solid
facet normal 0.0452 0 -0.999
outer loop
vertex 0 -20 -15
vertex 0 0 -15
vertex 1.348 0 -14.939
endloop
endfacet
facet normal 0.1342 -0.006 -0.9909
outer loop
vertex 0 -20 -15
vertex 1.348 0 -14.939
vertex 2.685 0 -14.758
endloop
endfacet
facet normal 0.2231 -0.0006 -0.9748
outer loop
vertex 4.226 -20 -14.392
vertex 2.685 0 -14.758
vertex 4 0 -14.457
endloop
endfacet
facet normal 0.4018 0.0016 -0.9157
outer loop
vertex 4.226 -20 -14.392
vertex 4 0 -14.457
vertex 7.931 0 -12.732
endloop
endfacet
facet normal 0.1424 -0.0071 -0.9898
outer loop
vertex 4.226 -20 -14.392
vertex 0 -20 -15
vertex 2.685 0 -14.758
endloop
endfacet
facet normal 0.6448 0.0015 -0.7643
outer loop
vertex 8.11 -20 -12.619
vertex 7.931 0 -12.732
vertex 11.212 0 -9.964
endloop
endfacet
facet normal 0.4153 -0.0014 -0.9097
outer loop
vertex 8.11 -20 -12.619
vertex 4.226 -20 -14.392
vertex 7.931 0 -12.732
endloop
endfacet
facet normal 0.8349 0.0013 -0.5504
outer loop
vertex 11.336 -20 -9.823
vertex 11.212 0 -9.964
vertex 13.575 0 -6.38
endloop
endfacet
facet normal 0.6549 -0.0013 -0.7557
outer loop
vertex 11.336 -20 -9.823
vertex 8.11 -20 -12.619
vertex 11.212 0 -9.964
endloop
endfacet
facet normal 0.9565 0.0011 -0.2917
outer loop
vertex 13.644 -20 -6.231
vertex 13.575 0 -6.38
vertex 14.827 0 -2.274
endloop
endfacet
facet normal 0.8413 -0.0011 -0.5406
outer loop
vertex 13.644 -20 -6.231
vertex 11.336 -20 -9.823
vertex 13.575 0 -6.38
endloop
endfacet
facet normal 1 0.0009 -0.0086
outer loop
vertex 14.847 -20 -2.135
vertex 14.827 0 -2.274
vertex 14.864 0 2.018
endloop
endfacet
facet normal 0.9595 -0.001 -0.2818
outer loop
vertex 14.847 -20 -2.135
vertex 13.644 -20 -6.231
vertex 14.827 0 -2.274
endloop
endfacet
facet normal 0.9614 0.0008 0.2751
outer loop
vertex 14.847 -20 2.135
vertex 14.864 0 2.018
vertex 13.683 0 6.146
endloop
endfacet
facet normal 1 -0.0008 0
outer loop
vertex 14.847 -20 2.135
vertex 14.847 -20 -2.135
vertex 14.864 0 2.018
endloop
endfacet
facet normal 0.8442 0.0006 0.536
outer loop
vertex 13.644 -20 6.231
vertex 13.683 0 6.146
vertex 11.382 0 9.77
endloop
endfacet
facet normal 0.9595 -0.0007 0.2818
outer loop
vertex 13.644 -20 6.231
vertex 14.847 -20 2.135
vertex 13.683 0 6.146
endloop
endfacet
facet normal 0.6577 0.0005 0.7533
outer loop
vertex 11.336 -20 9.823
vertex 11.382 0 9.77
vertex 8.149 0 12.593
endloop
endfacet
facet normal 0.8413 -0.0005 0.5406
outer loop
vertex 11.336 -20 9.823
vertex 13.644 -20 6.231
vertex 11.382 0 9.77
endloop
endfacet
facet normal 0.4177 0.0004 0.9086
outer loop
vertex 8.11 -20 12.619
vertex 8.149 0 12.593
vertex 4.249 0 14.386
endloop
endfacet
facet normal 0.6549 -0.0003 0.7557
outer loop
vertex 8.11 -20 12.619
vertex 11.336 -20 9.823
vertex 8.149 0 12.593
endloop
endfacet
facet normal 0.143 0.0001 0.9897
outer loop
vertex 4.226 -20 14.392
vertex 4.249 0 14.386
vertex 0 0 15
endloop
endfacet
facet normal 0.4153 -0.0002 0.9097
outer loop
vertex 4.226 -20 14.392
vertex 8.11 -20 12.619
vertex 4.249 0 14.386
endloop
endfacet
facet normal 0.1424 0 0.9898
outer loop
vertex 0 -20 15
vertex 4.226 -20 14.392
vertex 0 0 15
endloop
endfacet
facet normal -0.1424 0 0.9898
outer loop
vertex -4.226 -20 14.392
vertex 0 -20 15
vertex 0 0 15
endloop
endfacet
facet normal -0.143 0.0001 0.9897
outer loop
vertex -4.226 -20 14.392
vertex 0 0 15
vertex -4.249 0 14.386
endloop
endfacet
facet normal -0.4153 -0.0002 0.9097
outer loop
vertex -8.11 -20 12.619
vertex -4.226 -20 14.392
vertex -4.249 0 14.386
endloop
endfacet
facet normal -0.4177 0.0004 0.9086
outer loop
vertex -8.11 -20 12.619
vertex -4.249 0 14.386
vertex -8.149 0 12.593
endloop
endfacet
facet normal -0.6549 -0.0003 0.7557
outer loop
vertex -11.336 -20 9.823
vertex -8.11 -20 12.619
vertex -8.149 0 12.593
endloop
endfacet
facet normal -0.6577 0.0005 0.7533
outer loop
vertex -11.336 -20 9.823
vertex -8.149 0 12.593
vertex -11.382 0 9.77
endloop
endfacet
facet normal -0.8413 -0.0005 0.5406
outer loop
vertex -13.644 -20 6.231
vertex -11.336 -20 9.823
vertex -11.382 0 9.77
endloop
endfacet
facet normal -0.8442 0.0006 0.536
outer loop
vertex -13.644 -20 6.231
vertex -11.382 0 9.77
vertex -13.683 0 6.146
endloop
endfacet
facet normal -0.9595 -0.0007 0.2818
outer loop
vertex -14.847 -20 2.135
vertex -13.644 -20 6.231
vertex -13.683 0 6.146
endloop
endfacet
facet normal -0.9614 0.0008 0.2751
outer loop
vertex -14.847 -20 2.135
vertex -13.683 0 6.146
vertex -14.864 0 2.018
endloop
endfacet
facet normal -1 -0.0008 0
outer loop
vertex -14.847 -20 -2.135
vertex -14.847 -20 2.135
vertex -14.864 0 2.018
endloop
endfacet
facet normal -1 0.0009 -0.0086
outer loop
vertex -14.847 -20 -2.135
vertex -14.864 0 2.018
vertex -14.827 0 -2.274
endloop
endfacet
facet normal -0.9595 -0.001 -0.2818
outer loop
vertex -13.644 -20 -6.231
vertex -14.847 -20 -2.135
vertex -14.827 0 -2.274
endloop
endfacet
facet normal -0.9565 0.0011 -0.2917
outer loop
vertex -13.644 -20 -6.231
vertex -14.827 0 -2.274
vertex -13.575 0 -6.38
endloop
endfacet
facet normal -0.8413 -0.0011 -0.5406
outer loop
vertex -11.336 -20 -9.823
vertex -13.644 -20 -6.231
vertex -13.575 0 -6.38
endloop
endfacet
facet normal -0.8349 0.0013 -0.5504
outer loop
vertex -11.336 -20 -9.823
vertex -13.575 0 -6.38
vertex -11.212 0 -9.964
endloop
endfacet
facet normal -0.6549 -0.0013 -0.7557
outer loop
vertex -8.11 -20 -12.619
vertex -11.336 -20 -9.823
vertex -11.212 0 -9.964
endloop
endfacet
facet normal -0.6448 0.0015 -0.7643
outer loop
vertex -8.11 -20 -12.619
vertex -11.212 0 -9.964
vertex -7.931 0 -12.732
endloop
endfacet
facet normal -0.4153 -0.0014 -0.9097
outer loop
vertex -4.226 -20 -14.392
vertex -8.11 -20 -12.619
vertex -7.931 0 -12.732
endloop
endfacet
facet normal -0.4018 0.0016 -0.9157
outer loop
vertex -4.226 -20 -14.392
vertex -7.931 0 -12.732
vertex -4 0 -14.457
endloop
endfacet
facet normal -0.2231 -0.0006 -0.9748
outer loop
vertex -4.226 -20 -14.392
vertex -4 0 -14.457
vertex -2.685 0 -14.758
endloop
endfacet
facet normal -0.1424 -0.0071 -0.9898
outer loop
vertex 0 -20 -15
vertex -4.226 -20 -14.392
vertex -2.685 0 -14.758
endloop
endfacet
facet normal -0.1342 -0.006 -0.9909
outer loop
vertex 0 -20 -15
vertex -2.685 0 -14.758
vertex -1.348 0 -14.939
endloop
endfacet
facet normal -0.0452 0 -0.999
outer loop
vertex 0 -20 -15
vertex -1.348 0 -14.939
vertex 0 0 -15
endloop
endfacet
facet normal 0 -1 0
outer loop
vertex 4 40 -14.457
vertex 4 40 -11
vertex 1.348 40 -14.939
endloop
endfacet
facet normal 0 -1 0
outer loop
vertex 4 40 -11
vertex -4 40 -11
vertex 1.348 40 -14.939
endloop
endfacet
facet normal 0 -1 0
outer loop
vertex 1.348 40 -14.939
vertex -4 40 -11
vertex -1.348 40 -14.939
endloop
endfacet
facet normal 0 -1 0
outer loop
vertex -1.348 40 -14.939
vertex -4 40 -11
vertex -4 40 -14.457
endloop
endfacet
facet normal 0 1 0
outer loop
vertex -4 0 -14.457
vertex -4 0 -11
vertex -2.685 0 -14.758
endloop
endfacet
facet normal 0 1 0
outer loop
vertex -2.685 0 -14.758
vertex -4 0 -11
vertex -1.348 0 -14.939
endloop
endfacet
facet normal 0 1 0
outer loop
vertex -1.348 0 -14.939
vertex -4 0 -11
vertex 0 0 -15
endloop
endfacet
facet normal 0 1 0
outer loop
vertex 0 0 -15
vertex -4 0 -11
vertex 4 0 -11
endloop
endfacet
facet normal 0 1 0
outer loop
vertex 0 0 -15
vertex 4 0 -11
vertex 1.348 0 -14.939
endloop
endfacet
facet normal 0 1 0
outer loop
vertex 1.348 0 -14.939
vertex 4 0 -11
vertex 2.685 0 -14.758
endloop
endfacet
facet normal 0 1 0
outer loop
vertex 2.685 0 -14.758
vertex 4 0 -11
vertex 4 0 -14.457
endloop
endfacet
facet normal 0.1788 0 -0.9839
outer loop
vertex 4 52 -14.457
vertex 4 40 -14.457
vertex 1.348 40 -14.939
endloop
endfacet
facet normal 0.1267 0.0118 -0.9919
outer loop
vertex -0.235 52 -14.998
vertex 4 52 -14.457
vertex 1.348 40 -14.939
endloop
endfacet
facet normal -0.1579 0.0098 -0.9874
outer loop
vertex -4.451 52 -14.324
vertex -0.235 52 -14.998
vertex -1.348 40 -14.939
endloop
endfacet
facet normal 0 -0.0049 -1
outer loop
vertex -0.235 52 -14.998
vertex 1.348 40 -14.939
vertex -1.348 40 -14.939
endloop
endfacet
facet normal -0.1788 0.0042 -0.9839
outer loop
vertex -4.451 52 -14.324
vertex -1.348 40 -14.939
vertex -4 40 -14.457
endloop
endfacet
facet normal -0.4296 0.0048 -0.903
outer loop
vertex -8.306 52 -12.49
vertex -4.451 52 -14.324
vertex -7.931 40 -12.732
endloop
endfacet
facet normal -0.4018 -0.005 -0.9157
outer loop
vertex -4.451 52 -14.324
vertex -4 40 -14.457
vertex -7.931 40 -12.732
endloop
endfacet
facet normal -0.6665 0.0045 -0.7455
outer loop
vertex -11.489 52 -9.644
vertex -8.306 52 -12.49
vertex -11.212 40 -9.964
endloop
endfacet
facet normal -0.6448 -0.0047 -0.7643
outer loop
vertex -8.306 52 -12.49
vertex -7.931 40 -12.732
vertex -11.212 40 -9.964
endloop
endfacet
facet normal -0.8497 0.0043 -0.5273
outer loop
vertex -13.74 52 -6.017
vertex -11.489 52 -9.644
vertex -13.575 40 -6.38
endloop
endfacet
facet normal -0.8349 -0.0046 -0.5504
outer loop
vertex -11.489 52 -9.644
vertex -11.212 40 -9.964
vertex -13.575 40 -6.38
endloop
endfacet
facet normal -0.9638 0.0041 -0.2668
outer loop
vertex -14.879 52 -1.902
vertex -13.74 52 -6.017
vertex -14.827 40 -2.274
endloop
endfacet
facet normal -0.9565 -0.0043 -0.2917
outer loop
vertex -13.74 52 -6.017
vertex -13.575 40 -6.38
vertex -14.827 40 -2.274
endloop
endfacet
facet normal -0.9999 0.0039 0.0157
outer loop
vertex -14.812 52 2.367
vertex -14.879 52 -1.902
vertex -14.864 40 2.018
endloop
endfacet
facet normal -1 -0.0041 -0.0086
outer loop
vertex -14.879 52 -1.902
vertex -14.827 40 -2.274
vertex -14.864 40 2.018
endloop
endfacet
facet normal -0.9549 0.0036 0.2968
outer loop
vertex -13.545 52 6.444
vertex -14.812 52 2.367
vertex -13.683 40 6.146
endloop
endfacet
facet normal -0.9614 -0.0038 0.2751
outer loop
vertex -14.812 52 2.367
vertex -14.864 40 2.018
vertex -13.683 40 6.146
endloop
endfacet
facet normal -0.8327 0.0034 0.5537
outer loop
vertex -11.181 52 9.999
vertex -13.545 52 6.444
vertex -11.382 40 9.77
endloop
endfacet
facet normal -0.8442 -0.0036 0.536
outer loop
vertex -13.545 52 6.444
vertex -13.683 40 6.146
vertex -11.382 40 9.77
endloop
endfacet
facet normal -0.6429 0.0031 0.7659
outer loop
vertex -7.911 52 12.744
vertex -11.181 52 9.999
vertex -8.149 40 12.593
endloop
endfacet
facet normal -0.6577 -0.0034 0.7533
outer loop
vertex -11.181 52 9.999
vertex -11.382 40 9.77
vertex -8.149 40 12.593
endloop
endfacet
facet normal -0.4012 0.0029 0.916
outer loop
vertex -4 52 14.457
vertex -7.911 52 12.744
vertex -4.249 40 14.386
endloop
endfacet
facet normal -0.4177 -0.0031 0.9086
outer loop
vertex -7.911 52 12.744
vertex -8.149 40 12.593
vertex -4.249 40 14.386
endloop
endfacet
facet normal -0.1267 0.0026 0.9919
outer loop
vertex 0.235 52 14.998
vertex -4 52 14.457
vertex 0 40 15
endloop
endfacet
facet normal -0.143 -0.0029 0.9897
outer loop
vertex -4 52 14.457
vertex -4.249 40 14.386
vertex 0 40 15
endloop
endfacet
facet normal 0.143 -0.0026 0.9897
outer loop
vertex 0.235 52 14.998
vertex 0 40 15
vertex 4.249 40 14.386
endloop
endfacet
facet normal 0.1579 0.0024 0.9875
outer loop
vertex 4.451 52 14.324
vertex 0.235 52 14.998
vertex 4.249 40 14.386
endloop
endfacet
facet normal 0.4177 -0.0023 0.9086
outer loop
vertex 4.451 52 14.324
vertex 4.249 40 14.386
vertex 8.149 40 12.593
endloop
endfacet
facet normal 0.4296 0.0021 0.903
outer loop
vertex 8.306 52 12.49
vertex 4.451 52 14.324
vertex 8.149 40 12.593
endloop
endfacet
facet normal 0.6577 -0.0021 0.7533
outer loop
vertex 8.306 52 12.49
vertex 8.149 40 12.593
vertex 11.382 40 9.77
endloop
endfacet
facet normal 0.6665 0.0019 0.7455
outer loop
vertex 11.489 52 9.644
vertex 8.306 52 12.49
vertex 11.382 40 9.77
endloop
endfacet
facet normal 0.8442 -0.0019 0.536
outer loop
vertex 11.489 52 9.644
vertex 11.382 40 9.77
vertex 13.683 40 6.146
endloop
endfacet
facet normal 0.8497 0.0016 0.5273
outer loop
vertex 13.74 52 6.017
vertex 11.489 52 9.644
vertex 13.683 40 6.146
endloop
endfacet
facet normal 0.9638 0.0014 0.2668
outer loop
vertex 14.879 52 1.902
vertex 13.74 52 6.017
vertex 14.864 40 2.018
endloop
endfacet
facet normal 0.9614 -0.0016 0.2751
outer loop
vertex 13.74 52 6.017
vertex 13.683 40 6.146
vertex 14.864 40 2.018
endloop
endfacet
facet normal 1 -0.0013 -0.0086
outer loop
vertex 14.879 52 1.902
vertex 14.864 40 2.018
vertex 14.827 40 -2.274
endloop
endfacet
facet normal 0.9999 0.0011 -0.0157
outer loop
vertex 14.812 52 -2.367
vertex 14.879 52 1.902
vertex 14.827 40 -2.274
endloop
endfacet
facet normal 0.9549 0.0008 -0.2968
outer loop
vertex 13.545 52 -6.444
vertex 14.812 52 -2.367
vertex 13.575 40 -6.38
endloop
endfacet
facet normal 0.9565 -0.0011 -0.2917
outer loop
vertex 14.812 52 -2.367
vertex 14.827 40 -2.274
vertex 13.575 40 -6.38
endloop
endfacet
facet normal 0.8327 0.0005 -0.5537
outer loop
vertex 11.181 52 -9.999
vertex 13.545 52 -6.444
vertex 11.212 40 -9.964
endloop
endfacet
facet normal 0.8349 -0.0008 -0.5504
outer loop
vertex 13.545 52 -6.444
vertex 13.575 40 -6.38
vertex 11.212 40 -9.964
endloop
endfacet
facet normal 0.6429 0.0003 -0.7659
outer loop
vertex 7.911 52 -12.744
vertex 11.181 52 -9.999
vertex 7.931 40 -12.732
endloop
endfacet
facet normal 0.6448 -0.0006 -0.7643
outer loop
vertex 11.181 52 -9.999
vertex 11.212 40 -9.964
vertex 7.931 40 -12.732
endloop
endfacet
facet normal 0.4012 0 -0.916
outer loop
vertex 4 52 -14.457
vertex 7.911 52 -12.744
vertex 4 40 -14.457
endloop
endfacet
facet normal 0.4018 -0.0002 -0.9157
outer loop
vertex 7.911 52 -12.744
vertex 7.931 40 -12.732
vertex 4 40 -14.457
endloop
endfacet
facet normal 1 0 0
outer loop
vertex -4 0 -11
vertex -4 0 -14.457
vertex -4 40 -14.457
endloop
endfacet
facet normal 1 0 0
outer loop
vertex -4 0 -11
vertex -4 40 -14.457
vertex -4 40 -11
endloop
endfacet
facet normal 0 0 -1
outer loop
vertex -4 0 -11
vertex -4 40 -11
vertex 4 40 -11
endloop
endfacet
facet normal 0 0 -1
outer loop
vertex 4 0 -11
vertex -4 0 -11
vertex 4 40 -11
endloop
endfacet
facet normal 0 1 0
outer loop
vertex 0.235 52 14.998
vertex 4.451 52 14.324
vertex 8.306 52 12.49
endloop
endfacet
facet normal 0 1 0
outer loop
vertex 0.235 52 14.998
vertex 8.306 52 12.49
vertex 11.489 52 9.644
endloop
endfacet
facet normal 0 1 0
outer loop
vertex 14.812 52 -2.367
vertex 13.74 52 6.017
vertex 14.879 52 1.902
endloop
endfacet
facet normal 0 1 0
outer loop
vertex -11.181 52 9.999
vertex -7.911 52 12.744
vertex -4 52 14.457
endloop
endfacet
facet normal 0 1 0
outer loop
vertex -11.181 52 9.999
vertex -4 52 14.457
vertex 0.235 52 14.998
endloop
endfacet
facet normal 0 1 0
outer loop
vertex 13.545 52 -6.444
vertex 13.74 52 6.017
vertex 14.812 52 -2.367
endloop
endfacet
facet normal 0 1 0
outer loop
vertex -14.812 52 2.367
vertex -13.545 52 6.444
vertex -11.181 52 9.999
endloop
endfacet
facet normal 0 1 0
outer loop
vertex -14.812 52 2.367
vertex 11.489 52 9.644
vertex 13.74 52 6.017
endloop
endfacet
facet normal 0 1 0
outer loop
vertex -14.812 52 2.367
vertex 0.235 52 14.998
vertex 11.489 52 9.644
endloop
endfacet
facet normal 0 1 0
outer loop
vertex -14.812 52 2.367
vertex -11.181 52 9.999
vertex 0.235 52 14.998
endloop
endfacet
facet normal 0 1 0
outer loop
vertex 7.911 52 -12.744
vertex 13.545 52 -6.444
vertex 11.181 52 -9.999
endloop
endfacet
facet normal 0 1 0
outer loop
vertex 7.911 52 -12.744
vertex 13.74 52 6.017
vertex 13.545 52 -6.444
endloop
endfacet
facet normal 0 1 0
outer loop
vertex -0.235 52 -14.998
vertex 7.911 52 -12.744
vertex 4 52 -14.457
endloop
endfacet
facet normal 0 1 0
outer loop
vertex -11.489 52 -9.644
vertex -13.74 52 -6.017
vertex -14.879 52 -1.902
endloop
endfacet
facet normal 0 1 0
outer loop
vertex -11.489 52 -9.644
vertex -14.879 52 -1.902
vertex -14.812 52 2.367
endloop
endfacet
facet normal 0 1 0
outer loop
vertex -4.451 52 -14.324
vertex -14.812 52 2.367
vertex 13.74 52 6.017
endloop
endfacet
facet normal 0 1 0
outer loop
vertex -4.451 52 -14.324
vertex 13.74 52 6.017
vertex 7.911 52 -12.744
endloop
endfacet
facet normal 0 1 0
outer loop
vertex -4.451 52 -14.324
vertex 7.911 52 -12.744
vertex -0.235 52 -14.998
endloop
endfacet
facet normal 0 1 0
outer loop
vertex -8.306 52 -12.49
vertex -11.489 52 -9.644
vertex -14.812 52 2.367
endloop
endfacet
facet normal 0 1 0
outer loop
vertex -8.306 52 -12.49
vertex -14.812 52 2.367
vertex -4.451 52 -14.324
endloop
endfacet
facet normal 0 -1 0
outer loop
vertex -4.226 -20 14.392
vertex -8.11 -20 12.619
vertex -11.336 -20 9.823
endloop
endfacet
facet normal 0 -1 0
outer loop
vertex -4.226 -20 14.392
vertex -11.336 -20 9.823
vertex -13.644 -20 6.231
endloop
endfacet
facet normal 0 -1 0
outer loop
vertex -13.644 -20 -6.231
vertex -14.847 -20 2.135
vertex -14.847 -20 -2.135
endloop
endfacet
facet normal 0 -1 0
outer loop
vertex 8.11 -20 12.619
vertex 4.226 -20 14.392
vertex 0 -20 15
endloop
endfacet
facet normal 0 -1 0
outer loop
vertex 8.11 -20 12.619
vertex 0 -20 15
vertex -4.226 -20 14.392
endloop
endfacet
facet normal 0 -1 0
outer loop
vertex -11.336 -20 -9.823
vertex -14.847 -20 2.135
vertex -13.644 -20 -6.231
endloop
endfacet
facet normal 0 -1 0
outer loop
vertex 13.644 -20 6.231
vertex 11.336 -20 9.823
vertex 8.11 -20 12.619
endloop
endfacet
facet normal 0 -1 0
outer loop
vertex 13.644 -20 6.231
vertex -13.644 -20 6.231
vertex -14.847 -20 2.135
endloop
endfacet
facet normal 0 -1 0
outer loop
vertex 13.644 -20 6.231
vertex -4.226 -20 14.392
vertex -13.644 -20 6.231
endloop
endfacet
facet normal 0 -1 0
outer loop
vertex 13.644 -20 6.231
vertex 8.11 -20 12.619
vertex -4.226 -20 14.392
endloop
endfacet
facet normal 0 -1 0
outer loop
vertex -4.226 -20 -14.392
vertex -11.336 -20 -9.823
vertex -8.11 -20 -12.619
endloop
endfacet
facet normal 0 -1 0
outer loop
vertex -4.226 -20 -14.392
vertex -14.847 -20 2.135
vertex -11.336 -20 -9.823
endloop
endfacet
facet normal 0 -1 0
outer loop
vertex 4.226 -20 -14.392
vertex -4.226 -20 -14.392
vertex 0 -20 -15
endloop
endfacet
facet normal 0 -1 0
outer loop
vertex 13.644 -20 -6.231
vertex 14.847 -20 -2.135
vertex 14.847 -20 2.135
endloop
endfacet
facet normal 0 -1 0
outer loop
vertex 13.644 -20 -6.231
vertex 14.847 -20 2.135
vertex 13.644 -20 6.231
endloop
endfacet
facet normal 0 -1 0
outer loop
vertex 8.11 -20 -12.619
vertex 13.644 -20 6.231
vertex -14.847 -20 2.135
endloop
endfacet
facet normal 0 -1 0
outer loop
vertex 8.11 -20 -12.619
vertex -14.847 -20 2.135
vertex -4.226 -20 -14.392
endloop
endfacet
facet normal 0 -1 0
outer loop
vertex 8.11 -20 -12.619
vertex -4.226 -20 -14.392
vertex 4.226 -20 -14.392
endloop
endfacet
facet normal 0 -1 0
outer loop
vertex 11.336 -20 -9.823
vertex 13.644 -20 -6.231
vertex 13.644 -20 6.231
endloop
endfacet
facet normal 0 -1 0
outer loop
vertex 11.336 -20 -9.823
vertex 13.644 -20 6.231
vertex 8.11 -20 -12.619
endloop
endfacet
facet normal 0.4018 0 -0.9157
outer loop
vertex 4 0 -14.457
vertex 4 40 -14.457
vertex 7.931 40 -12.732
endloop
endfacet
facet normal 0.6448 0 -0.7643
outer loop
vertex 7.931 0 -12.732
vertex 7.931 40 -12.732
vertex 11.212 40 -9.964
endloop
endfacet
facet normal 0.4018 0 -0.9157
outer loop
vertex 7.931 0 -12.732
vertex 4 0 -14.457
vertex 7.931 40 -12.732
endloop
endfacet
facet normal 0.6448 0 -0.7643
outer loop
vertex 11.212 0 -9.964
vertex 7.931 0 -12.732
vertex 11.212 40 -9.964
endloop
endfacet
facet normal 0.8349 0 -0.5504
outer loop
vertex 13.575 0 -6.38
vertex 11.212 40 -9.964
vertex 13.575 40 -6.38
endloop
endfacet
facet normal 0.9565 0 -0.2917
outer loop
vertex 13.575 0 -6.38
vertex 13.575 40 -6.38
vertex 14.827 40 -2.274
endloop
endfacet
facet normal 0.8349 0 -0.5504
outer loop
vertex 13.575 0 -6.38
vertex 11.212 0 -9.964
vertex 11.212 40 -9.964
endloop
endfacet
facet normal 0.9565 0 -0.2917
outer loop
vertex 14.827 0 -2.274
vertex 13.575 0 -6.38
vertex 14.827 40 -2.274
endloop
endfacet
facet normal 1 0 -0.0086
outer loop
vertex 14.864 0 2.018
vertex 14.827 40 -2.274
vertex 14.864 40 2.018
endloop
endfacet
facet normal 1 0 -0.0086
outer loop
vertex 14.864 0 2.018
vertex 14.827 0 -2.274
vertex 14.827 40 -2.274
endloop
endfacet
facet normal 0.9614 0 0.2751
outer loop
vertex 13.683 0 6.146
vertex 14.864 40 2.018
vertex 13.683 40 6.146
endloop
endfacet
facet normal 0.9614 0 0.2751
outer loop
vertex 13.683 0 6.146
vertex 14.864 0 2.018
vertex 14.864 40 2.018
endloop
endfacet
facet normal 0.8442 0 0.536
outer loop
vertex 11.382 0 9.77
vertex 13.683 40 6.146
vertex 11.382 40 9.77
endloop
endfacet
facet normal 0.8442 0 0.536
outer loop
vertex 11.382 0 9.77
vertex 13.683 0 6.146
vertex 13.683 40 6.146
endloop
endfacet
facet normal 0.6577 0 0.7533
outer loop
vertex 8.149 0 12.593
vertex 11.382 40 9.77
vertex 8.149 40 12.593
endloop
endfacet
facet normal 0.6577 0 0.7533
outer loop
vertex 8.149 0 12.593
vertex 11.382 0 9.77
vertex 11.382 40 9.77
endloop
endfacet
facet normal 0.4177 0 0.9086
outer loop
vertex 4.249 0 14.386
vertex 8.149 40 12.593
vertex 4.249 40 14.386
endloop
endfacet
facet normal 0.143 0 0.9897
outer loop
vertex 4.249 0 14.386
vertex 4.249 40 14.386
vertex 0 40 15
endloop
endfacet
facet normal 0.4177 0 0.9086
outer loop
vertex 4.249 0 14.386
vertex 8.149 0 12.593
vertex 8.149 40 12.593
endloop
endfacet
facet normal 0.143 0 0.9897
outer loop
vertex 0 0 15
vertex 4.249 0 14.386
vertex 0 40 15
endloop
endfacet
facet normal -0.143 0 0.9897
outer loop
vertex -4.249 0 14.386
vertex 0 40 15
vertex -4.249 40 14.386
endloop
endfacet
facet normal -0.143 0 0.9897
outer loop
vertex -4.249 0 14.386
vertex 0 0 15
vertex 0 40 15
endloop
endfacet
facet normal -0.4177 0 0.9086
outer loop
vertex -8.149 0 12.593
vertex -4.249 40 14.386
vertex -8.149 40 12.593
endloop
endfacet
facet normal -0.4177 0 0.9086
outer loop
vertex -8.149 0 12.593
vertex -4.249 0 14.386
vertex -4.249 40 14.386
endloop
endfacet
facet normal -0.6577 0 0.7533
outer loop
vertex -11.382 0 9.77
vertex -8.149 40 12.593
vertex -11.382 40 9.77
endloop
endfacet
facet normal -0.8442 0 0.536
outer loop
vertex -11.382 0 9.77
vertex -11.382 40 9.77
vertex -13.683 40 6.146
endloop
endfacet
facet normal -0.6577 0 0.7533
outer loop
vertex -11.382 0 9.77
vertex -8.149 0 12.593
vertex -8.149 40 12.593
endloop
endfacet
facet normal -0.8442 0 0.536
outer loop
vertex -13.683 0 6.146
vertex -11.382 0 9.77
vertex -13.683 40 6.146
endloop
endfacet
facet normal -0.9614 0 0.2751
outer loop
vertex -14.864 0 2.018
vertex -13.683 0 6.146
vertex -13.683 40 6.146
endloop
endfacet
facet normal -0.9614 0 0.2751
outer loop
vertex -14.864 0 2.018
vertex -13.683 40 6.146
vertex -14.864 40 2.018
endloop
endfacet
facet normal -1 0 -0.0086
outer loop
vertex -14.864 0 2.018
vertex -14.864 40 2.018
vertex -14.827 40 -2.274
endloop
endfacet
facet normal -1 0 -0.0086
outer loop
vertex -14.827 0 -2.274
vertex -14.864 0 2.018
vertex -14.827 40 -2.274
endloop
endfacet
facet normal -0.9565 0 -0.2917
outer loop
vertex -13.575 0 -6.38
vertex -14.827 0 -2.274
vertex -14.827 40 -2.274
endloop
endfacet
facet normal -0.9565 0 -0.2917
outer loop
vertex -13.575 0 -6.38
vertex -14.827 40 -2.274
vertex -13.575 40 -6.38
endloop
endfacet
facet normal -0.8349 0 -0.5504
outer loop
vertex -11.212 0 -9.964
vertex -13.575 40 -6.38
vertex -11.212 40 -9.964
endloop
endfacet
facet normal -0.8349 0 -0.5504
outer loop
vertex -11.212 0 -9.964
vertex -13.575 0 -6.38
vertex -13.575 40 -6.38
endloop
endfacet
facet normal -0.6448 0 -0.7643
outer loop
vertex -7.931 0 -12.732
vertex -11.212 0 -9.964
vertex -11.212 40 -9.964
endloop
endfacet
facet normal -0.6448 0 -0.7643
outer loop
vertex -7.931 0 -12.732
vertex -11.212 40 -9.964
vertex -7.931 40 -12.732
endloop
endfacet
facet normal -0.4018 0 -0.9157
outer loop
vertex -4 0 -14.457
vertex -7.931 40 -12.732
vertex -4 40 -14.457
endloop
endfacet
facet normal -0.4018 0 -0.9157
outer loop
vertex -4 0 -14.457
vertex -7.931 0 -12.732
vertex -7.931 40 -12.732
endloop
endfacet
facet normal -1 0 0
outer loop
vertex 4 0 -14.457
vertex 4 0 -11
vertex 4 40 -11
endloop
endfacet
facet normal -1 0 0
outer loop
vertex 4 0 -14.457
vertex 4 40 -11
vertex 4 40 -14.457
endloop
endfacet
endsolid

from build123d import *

# Parameters (mm, degrees)
BOSS_EXTRUDE1_DEPTH = 40
SKETCH2_R           = 15
BOSS_EXTRUDE2_DEPTH = 12
BOSS_EXTRUDE3_START = 20
SKETCH3_R           = 15
BOSS_EXTRUDE3_DEPTH = 20


with BuildPart() as part:
    # Sketch1 → Boss-Extrude1 (new body)
    with BuildSketch(Plane(origin=(0, 0, 0), x_dir=(1, 0, 0), z_dir=(0, 1, 0))):
        with BuildLine():
            Line((-4, 11), (4, 11))
            Line((4, 11), (4, 14.456832295))
            ThreePointArc((4, 14.456832295), (0, -15), (-4, 14.456832295))
            Line((-4, 14.456832295), (-4, 11))
        make_face()
    extrude(amount=BOSS_EXTRUDE1_DEPTH)

    # Sketch2 → Boss-Extrude2 (add)
    with BuildSketch(Plane(origin=(0, 40, 0), x_dir=(1, 0, 0), z_dir=(0, 1, 0))):
        with Locations(Location((0, 0, 0), (0, 0, 74.533990047))):
            Circle(SKETCH2_R)
    extrude(amount=BOSS_EXTRUDE2_DEPTH)

    # Sketch3 → Boss-Extrude3 (add)
    with BuildSketch(Plane.XZ.offset(BOSS_EXTRUDE3_START)):
        with Locations(Location((0, 0, 0), (0, 0, 270))):
            Circle(SKETCH3_R)
    extrude(amount=-BOSS_EXTRUDE3_DEPTH)


solid = part.part
